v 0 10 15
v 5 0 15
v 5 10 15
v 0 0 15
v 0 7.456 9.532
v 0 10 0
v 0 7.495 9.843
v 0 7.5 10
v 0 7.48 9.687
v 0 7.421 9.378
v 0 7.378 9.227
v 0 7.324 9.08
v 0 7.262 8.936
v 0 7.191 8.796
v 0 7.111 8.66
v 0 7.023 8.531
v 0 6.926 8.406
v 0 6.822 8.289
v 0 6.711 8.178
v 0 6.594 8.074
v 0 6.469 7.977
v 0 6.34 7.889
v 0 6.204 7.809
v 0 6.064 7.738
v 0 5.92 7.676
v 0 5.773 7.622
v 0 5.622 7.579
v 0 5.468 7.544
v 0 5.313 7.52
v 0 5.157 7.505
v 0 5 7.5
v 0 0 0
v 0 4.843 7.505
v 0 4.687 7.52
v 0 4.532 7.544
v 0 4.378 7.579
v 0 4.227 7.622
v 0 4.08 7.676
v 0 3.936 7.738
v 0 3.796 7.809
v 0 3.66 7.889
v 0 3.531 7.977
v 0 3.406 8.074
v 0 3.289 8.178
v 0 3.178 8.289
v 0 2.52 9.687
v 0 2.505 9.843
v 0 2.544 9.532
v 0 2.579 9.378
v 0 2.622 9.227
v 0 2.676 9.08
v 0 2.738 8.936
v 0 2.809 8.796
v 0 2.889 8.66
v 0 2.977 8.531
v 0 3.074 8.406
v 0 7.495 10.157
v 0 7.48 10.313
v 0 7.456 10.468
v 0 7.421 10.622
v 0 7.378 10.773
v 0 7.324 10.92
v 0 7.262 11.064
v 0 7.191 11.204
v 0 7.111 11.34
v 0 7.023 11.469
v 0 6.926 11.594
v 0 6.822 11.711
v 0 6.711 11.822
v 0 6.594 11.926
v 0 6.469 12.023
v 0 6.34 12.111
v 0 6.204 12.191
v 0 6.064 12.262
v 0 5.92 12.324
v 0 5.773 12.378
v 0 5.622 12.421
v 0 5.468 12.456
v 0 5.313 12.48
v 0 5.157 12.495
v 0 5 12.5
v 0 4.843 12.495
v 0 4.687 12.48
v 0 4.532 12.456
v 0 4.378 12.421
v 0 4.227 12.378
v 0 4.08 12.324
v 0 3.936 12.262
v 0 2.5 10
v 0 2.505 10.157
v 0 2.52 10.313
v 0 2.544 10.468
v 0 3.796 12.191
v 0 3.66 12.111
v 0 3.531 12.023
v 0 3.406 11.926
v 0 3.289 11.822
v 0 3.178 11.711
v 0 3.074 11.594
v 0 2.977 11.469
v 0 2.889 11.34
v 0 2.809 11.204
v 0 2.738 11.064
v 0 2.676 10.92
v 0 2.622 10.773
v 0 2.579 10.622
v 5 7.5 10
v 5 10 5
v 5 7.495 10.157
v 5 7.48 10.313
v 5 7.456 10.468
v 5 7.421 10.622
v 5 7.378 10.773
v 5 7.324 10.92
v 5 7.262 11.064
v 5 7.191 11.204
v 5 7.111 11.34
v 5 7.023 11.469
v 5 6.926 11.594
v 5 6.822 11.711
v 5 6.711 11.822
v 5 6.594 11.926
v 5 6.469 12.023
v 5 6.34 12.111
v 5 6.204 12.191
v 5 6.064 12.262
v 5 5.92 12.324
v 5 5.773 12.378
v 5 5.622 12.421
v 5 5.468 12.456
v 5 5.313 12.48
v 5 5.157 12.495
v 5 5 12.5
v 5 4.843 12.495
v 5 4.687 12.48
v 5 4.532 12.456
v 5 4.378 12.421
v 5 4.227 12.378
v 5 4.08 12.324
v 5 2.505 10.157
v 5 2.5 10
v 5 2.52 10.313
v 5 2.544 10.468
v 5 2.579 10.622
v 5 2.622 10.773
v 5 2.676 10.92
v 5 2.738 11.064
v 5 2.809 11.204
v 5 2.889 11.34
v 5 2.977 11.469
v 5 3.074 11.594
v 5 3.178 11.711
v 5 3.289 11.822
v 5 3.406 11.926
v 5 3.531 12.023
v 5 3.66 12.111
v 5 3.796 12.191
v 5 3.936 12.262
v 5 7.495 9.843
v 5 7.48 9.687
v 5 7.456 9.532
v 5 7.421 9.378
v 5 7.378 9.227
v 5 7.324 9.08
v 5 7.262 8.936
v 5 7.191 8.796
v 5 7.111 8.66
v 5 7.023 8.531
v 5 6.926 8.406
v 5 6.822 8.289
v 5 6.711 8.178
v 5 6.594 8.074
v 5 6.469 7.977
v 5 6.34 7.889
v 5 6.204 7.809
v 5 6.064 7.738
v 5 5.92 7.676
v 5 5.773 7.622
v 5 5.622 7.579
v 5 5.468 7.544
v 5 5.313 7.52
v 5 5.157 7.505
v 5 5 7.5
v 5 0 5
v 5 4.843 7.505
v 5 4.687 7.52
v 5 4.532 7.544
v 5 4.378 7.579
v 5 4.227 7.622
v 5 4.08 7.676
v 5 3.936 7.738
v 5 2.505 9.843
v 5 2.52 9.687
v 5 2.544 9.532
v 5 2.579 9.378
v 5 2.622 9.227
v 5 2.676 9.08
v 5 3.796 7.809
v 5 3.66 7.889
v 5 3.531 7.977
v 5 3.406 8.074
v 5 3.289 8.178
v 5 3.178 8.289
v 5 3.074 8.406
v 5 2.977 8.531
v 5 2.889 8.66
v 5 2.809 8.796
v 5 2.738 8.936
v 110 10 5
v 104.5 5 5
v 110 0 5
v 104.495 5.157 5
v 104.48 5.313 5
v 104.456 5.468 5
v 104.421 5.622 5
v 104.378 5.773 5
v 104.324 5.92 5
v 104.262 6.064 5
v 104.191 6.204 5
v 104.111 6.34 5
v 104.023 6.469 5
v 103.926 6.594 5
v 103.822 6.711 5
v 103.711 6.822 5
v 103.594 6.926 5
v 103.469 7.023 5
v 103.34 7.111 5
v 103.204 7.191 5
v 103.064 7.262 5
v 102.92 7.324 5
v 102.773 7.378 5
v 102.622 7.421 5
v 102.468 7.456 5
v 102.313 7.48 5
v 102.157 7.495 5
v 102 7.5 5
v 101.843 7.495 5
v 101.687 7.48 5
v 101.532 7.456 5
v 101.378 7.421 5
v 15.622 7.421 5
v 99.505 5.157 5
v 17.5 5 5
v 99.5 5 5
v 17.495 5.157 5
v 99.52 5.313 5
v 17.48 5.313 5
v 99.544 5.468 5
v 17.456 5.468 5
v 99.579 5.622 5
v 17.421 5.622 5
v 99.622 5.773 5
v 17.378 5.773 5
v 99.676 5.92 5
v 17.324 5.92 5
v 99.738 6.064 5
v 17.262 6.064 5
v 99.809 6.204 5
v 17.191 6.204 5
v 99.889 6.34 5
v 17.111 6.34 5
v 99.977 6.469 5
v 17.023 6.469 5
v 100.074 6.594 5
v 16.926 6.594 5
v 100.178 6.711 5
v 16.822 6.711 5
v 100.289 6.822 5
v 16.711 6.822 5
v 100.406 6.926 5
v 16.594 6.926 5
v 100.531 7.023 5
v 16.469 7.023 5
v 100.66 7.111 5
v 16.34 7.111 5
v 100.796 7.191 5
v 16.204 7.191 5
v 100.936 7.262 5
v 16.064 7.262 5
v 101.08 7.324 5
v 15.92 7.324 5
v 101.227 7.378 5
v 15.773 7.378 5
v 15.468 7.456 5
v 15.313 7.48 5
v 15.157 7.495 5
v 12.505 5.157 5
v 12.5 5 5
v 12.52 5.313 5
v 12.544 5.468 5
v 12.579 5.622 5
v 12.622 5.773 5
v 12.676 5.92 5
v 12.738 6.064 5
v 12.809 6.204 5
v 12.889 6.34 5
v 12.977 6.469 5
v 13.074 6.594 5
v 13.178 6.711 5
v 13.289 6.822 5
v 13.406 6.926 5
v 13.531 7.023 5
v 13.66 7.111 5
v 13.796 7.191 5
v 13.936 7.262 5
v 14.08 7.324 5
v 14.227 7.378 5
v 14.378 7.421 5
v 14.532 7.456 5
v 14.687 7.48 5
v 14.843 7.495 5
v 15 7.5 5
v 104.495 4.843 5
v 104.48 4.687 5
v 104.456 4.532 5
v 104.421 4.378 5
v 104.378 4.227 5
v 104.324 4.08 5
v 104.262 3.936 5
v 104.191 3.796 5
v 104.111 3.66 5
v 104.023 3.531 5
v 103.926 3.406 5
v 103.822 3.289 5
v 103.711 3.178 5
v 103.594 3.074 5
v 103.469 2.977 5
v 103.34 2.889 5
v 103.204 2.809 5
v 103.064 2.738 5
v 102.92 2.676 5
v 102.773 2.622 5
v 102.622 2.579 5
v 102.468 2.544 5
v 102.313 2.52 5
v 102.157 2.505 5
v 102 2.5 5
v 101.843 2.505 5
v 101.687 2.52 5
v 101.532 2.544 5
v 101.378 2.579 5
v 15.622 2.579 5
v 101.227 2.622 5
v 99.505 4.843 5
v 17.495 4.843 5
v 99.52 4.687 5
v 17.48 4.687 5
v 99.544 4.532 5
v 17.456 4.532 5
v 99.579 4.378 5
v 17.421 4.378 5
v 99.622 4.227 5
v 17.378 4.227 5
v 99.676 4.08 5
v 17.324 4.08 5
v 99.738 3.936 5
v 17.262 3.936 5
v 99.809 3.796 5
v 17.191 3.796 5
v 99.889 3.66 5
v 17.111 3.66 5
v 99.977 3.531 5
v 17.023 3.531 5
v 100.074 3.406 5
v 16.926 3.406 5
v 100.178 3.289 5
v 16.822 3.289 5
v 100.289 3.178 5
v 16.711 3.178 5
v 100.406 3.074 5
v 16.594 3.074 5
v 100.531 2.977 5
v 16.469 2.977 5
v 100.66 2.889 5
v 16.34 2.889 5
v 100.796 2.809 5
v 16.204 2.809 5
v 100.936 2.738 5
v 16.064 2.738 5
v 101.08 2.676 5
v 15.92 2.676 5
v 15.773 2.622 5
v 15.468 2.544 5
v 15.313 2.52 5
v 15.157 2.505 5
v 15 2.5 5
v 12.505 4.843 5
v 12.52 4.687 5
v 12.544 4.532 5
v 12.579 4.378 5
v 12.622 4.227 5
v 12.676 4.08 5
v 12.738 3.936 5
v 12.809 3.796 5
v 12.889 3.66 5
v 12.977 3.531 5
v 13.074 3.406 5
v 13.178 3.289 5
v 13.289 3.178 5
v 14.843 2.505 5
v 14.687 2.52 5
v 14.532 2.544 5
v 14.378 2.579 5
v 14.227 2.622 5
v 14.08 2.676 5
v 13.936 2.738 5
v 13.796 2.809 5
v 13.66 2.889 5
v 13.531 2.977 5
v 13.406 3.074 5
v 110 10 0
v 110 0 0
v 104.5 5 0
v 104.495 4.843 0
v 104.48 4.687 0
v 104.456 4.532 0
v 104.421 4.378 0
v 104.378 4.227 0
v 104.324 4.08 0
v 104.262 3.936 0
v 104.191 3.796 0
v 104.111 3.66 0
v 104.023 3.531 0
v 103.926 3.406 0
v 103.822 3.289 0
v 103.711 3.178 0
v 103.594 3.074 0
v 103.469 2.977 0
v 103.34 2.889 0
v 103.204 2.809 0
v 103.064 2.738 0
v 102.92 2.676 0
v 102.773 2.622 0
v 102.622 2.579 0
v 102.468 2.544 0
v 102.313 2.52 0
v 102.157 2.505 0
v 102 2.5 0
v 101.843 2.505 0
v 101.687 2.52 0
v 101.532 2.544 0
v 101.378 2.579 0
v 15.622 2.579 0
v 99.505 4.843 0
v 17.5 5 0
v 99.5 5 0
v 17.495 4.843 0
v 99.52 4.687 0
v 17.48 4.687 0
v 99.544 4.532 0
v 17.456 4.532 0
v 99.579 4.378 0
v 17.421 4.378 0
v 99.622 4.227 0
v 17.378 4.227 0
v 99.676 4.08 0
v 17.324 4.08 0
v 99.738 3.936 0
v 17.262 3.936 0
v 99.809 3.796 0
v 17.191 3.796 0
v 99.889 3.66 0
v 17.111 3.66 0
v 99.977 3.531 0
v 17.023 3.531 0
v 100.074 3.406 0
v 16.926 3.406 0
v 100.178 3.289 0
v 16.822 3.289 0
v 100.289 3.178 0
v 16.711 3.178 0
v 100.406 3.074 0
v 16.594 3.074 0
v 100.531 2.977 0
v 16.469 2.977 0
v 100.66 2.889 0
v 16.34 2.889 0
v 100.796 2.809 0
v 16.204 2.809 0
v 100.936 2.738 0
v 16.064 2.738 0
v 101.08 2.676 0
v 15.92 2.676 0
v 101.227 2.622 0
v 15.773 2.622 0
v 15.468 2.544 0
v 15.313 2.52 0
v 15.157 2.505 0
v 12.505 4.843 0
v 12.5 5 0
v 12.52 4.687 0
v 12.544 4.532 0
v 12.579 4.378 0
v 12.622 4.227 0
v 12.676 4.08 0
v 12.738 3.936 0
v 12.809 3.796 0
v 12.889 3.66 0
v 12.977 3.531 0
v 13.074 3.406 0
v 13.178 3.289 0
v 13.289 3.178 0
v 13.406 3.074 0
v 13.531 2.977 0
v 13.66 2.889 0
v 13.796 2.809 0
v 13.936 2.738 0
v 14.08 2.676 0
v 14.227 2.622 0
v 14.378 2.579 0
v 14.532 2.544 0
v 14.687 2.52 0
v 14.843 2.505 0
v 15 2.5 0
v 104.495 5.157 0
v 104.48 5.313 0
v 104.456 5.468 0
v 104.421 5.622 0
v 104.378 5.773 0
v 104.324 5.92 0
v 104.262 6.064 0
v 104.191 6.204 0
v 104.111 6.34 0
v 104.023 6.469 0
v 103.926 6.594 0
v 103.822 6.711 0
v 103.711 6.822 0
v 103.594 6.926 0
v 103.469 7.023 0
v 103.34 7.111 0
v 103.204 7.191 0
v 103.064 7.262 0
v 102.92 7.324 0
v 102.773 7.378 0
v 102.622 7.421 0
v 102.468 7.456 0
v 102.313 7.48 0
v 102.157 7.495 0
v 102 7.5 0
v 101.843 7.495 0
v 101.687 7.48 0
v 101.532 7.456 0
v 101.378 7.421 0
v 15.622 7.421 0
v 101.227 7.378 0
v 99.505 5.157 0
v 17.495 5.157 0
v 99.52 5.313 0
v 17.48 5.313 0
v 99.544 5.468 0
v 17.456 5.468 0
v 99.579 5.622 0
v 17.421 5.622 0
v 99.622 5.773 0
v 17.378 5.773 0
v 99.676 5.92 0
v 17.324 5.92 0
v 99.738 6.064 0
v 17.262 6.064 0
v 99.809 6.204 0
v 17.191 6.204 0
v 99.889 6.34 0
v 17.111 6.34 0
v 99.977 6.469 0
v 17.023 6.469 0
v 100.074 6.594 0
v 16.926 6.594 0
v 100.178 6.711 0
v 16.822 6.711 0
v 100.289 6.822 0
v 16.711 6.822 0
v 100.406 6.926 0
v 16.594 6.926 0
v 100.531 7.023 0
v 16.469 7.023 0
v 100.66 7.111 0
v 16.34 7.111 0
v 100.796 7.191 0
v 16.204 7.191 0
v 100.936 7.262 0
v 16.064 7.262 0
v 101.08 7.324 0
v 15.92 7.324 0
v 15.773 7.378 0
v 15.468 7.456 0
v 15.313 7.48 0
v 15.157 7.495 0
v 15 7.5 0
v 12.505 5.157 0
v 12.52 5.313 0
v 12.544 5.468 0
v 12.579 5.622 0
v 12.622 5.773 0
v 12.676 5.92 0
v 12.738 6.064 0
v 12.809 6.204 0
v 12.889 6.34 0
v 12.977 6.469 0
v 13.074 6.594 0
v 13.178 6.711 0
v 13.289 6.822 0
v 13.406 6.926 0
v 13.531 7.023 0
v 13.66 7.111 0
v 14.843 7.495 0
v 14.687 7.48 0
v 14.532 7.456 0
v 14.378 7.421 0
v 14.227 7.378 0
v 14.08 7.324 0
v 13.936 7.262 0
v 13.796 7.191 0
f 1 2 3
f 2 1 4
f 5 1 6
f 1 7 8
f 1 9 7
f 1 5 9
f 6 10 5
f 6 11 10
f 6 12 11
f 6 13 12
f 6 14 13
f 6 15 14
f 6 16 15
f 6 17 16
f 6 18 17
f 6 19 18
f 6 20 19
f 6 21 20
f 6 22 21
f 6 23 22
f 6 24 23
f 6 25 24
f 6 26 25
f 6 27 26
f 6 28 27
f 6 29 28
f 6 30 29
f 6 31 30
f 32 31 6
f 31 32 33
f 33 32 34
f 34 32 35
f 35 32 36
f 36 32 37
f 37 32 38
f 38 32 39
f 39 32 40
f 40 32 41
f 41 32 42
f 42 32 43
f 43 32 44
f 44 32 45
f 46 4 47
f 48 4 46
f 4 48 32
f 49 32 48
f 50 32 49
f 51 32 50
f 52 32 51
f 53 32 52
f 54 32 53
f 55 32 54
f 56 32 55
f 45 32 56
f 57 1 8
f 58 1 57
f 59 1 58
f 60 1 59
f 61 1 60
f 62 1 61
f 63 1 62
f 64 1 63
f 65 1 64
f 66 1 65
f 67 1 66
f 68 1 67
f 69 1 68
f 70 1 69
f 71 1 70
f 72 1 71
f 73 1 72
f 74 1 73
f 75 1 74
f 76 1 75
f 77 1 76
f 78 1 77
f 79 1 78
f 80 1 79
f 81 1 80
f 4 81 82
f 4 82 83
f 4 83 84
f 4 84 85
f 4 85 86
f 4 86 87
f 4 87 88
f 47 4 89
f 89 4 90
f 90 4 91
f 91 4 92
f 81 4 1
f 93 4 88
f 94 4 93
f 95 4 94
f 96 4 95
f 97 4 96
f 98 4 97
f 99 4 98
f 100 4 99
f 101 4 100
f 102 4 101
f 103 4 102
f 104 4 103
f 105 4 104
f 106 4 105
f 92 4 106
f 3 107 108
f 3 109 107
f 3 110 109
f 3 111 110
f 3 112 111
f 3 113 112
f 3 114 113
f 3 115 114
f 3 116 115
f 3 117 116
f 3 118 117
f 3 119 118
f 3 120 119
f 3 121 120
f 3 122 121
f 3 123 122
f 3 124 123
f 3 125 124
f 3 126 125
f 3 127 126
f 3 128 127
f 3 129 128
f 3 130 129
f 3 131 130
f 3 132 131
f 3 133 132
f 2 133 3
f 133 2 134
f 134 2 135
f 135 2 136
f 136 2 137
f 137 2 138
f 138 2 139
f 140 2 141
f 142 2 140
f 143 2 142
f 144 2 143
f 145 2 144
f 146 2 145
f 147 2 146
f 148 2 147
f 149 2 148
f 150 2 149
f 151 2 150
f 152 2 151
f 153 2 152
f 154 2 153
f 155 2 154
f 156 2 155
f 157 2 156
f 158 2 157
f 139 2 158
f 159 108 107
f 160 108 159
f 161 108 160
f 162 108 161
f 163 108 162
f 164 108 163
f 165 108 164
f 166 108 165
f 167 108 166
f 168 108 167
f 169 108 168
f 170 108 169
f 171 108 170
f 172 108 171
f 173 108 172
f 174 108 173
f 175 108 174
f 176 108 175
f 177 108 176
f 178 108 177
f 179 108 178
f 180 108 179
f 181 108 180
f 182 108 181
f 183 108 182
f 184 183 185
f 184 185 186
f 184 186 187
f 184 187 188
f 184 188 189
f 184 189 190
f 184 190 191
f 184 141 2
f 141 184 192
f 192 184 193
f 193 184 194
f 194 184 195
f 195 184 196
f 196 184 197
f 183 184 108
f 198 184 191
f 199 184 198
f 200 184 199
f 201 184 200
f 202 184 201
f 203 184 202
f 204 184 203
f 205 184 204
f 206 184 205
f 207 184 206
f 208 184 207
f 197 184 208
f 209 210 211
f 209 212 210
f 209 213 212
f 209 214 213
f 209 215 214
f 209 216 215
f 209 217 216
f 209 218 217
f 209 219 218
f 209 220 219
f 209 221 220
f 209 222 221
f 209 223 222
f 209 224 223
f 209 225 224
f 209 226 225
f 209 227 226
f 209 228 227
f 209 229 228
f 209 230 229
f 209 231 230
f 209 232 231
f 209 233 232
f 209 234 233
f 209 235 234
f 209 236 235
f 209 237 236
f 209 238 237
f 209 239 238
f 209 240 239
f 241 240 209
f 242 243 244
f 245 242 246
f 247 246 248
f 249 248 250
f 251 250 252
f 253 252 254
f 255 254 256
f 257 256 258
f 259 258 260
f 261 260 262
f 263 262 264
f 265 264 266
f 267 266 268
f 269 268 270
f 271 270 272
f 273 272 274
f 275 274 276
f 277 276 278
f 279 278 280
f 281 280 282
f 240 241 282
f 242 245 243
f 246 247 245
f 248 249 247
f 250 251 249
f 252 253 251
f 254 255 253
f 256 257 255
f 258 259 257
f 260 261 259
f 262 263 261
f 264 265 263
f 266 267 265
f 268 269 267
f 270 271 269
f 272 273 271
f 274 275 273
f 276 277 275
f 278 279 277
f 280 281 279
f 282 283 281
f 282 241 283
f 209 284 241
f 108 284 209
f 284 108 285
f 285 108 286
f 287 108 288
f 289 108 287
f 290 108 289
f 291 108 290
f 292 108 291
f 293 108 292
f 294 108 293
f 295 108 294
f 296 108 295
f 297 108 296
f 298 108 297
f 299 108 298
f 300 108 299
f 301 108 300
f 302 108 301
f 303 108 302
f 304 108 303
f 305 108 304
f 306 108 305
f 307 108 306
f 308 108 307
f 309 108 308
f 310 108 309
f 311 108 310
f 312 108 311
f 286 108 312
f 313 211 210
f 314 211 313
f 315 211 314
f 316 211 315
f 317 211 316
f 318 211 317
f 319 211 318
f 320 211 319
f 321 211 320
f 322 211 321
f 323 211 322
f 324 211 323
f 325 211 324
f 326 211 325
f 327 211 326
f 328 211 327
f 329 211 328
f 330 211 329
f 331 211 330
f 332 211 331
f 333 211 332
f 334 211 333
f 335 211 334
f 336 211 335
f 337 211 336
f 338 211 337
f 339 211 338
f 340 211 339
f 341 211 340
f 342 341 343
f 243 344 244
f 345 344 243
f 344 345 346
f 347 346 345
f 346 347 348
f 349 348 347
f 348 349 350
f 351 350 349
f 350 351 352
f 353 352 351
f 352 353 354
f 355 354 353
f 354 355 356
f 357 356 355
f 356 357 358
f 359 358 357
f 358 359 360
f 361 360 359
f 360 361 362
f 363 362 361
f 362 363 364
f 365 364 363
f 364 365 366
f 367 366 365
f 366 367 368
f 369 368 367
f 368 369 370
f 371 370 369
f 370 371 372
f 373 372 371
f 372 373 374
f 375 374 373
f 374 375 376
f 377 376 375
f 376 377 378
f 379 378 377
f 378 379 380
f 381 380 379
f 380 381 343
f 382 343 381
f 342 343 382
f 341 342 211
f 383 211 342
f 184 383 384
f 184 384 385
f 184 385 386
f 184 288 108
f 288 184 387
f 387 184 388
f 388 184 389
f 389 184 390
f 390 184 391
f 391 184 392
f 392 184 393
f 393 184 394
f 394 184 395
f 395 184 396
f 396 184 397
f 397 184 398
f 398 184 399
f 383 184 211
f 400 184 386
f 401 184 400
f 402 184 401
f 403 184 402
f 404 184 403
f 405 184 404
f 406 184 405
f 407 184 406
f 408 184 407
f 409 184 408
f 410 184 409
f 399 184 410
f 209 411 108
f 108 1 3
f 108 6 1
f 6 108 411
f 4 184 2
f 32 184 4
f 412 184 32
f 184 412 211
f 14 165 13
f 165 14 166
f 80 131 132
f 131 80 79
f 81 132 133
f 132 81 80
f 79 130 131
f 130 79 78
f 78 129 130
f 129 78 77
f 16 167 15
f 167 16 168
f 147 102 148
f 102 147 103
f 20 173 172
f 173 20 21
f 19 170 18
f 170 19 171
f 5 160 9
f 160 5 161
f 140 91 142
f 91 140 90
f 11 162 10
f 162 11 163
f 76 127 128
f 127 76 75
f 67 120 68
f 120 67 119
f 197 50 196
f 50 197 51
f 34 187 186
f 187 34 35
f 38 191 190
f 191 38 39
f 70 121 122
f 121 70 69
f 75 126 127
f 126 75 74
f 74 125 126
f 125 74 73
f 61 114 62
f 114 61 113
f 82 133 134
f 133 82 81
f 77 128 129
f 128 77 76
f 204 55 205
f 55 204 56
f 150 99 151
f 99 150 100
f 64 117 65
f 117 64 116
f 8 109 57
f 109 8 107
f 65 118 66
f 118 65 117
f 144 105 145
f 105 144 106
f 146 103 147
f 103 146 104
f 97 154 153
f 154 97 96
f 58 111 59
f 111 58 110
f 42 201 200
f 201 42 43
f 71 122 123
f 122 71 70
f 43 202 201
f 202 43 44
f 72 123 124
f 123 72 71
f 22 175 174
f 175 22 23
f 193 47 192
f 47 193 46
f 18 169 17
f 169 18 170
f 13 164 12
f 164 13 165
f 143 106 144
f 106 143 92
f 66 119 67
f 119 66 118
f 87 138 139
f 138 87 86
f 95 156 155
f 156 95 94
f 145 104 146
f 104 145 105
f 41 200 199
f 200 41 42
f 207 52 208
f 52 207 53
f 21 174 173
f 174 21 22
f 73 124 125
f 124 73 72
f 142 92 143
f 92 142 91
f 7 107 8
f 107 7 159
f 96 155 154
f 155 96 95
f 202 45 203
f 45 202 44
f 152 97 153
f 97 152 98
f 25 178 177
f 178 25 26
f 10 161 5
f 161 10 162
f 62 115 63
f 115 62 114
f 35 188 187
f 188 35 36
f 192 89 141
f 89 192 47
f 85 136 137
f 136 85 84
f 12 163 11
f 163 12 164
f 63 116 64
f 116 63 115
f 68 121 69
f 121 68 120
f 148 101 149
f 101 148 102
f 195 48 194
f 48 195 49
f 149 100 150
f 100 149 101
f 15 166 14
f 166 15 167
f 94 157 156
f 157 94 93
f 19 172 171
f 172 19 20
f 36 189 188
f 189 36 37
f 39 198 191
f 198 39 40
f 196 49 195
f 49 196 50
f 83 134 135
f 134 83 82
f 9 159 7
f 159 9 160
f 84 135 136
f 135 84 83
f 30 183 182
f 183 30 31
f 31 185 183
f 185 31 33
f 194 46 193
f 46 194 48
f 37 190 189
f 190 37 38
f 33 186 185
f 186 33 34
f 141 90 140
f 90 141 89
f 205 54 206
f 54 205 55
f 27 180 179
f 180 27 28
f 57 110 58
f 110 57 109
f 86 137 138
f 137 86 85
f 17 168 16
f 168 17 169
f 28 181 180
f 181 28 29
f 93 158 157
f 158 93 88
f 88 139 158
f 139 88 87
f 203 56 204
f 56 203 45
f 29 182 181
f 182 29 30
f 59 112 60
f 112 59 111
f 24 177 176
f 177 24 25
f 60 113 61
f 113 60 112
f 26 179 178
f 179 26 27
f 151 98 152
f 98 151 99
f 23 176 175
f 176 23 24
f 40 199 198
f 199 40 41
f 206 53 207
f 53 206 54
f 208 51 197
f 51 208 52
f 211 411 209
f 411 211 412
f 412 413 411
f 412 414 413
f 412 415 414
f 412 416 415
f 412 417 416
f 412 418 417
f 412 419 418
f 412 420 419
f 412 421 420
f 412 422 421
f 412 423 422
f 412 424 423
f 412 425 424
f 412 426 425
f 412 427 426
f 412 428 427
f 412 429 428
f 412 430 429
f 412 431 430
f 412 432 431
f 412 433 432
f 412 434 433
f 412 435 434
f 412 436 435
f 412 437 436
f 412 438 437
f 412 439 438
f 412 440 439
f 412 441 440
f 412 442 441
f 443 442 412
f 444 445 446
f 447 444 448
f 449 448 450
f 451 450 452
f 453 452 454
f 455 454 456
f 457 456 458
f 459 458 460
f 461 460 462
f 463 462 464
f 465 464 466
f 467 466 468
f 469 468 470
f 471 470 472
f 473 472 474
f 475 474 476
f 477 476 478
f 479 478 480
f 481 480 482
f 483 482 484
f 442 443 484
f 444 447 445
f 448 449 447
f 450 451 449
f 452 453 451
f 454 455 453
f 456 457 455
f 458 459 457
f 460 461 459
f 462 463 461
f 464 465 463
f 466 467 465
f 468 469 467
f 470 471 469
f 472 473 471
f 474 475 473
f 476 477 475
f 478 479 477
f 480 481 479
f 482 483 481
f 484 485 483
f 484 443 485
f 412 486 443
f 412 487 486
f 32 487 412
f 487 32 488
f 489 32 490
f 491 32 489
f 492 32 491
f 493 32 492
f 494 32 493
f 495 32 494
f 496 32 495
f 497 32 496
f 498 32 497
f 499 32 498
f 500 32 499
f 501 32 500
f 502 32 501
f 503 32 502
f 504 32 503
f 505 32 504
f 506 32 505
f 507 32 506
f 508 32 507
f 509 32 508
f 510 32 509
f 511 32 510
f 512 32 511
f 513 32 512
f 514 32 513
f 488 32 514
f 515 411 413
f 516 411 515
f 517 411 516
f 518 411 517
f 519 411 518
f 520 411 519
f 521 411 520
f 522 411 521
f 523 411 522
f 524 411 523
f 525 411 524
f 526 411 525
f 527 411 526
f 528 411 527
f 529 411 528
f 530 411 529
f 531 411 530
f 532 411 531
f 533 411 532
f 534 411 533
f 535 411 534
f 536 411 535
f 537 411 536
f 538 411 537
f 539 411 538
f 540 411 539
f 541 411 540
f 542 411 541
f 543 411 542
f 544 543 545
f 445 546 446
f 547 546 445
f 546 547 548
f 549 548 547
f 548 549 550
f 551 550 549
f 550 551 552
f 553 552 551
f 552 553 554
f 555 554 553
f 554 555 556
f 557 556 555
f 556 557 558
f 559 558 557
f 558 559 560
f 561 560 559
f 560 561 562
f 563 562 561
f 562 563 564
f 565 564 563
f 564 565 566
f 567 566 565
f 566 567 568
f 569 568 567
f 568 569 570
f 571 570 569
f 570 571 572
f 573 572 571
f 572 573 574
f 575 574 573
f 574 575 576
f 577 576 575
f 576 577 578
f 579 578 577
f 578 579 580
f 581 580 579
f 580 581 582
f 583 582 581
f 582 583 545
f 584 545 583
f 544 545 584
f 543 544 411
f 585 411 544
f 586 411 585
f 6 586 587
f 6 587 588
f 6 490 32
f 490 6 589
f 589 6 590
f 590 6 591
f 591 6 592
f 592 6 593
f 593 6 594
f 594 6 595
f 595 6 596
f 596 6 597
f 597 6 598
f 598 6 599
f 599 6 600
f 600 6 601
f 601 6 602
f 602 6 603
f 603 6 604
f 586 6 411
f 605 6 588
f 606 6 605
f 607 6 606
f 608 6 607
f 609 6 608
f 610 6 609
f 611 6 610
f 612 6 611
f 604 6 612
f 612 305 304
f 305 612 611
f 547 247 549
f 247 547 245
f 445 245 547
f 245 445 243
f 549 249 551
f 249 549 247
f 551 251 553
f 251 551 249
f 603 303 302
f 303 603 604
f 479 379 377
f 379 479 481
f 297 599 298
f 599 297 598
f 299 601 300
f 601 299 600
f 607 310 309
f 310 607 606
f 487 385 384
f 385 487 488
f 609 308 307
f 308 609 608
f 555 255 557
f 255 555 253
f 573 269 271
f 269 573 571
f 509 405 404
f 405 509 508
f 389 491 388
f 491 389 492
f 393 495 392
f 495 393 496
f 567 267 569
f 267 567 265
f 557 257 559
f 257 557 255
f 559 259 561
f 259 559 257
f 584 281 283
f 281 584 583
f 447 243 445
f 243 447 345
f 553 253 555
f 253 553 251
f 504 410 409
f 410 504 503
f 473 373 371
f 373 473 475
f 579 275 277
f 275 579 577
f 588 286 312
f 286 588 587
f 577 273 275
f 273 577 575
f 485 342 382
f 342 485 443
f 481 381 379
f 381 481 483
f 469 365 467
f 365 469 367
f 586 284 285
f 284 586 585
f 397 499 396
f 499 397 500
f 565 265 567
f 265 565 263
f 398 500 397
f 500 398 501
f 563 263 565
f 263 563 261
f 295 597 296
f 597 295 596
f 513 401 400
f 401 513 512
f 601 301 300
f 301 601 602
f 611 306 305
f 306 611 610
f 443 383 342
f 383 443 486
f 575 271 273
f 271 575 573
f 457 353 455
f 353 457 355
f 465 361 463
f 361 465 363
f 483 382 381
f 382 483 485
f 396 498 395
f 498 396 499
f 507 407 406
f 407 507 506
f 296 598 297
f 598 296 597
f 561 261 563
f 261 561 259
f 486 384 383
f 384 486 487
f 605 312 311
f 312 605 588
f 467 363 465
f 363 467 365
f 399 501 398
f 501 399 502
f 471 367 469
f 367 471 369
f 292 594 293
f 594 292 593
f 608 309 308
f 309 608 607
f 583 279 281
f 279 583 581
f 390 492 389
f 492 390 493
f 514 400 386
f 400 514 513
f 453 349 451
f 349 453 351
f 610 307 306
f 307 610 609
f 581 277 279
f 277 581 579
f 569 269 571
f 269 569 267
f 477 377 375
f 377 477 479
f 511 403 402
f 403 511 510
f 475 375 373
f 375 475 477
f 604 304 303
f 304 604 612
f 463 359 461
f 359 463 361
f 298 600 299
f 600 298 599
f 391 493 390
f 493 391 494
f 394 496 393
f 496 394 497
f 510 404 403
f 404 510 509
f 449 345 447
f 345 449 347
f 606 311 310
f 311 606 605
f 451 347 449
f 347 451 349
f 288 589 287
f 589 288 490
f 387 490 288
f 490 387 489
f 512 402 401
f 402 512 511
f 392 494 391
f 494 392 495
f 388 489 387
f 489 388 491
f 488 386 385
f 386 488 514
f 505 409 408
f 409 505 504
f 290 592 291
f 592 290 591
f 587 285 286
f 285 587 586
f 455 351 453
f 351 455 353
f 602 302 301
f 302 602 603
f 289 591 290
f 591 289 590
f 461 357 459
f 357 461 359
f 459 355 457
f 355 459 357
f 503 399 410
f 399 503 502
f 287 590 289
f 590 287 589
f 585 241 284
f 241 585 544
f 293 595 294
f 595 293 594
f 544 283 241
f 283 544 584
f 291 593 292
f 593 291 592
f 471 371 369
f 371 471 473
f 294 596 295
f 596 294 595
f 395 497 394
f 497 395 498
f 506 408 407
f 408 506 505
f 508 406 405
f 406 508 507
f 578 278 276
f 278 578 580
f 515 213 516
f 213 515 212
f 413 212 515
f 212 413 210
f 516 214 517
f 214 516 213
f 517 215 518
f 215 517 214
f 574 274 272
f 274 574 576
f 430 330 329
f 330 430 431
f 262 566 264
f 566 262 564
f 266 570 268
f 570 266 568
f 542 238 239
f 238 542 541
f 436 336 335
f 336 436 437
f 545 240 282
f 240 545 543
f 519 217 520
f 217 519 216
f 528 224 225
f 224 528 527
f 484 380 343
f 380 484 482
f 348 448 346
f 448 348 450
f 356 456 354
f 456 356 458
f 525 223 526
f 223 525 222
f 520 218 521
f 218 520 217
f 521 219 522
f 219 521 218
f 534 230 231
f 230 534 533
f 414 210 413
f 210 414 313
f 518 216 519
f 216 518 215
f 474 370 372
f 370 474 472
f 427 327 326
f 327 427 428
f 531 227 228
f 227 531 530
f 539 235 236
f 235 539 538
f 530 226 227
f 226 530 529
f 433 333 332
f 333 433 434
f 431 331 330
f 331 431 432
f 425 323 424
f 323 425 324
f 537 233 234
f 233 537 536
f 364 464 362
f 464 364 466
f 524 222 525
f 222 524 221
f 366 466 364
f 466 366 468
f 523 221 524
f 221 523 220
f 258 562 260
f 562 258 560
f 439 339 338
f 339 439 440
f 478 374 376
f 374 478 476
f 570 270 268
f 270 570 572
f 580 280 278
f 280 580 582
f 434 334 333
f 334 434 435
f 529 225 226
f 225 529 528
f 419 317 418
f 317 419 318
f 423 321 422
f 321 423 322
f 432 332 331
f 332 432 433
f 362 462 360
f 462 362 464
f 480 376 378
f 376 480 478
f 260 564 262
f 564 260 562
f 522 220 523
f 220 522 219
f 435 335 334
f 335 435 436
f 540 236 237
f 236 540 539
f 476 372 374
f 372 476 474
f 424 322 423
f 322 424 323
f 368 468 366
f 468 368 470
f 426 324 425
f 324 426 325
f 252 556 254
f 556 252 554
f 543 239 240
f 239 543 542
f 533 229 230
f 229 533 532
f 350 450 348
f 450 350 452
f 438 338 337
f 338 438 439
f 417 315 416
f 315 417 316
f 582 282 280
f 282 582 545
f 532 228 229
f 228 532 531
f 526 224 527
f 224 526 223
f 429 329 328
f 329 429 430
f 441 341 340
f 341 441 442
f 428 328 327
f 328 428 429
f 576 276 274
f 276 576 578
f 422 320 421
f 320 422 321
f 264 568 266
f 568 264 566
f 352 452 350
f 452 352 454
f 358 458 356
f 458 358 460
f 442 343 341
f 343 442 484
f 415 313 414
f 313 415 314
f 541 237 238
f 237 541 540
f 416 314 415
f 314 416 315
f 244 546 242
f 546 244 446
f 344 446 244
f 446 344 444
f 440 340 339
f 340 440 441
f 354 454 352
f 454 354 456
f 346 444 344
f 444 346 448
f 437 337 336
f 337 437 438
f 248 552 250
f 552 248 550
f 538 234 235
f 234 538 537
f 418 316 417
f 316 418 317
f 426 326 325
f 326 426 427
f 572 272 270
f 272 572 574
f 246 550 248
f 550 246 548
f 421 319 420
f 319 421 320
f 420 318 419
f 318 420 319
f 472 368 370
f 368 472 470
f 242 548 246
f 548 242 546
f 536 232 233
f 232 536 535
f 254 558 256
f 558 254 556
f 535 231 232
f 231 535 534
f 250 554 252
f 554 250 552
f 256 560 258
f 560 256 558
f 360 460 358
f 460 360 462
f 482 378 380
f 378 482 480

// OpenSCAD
betweenScrew = 87;
size = 95;

difference()
{
    union() {
        cube([size + 15, 10, 5]);

        translate([5, 0, 5])
        rotate([0, -90, 0]) {
            difference() {
                cube([10, 10, 5]);

                translate([5, 5, 0]) cylinder(r=2.5, h=10, center=true, $fn=100);
            }
        }
    }

    translate([15, 5, 0]) cylinder(r=2.5, h=10, center=true, $fn=100);
    translate([15+87, 5, 0]) cylinder(r=2.5, h=10, center=true, $fn=100);
}
